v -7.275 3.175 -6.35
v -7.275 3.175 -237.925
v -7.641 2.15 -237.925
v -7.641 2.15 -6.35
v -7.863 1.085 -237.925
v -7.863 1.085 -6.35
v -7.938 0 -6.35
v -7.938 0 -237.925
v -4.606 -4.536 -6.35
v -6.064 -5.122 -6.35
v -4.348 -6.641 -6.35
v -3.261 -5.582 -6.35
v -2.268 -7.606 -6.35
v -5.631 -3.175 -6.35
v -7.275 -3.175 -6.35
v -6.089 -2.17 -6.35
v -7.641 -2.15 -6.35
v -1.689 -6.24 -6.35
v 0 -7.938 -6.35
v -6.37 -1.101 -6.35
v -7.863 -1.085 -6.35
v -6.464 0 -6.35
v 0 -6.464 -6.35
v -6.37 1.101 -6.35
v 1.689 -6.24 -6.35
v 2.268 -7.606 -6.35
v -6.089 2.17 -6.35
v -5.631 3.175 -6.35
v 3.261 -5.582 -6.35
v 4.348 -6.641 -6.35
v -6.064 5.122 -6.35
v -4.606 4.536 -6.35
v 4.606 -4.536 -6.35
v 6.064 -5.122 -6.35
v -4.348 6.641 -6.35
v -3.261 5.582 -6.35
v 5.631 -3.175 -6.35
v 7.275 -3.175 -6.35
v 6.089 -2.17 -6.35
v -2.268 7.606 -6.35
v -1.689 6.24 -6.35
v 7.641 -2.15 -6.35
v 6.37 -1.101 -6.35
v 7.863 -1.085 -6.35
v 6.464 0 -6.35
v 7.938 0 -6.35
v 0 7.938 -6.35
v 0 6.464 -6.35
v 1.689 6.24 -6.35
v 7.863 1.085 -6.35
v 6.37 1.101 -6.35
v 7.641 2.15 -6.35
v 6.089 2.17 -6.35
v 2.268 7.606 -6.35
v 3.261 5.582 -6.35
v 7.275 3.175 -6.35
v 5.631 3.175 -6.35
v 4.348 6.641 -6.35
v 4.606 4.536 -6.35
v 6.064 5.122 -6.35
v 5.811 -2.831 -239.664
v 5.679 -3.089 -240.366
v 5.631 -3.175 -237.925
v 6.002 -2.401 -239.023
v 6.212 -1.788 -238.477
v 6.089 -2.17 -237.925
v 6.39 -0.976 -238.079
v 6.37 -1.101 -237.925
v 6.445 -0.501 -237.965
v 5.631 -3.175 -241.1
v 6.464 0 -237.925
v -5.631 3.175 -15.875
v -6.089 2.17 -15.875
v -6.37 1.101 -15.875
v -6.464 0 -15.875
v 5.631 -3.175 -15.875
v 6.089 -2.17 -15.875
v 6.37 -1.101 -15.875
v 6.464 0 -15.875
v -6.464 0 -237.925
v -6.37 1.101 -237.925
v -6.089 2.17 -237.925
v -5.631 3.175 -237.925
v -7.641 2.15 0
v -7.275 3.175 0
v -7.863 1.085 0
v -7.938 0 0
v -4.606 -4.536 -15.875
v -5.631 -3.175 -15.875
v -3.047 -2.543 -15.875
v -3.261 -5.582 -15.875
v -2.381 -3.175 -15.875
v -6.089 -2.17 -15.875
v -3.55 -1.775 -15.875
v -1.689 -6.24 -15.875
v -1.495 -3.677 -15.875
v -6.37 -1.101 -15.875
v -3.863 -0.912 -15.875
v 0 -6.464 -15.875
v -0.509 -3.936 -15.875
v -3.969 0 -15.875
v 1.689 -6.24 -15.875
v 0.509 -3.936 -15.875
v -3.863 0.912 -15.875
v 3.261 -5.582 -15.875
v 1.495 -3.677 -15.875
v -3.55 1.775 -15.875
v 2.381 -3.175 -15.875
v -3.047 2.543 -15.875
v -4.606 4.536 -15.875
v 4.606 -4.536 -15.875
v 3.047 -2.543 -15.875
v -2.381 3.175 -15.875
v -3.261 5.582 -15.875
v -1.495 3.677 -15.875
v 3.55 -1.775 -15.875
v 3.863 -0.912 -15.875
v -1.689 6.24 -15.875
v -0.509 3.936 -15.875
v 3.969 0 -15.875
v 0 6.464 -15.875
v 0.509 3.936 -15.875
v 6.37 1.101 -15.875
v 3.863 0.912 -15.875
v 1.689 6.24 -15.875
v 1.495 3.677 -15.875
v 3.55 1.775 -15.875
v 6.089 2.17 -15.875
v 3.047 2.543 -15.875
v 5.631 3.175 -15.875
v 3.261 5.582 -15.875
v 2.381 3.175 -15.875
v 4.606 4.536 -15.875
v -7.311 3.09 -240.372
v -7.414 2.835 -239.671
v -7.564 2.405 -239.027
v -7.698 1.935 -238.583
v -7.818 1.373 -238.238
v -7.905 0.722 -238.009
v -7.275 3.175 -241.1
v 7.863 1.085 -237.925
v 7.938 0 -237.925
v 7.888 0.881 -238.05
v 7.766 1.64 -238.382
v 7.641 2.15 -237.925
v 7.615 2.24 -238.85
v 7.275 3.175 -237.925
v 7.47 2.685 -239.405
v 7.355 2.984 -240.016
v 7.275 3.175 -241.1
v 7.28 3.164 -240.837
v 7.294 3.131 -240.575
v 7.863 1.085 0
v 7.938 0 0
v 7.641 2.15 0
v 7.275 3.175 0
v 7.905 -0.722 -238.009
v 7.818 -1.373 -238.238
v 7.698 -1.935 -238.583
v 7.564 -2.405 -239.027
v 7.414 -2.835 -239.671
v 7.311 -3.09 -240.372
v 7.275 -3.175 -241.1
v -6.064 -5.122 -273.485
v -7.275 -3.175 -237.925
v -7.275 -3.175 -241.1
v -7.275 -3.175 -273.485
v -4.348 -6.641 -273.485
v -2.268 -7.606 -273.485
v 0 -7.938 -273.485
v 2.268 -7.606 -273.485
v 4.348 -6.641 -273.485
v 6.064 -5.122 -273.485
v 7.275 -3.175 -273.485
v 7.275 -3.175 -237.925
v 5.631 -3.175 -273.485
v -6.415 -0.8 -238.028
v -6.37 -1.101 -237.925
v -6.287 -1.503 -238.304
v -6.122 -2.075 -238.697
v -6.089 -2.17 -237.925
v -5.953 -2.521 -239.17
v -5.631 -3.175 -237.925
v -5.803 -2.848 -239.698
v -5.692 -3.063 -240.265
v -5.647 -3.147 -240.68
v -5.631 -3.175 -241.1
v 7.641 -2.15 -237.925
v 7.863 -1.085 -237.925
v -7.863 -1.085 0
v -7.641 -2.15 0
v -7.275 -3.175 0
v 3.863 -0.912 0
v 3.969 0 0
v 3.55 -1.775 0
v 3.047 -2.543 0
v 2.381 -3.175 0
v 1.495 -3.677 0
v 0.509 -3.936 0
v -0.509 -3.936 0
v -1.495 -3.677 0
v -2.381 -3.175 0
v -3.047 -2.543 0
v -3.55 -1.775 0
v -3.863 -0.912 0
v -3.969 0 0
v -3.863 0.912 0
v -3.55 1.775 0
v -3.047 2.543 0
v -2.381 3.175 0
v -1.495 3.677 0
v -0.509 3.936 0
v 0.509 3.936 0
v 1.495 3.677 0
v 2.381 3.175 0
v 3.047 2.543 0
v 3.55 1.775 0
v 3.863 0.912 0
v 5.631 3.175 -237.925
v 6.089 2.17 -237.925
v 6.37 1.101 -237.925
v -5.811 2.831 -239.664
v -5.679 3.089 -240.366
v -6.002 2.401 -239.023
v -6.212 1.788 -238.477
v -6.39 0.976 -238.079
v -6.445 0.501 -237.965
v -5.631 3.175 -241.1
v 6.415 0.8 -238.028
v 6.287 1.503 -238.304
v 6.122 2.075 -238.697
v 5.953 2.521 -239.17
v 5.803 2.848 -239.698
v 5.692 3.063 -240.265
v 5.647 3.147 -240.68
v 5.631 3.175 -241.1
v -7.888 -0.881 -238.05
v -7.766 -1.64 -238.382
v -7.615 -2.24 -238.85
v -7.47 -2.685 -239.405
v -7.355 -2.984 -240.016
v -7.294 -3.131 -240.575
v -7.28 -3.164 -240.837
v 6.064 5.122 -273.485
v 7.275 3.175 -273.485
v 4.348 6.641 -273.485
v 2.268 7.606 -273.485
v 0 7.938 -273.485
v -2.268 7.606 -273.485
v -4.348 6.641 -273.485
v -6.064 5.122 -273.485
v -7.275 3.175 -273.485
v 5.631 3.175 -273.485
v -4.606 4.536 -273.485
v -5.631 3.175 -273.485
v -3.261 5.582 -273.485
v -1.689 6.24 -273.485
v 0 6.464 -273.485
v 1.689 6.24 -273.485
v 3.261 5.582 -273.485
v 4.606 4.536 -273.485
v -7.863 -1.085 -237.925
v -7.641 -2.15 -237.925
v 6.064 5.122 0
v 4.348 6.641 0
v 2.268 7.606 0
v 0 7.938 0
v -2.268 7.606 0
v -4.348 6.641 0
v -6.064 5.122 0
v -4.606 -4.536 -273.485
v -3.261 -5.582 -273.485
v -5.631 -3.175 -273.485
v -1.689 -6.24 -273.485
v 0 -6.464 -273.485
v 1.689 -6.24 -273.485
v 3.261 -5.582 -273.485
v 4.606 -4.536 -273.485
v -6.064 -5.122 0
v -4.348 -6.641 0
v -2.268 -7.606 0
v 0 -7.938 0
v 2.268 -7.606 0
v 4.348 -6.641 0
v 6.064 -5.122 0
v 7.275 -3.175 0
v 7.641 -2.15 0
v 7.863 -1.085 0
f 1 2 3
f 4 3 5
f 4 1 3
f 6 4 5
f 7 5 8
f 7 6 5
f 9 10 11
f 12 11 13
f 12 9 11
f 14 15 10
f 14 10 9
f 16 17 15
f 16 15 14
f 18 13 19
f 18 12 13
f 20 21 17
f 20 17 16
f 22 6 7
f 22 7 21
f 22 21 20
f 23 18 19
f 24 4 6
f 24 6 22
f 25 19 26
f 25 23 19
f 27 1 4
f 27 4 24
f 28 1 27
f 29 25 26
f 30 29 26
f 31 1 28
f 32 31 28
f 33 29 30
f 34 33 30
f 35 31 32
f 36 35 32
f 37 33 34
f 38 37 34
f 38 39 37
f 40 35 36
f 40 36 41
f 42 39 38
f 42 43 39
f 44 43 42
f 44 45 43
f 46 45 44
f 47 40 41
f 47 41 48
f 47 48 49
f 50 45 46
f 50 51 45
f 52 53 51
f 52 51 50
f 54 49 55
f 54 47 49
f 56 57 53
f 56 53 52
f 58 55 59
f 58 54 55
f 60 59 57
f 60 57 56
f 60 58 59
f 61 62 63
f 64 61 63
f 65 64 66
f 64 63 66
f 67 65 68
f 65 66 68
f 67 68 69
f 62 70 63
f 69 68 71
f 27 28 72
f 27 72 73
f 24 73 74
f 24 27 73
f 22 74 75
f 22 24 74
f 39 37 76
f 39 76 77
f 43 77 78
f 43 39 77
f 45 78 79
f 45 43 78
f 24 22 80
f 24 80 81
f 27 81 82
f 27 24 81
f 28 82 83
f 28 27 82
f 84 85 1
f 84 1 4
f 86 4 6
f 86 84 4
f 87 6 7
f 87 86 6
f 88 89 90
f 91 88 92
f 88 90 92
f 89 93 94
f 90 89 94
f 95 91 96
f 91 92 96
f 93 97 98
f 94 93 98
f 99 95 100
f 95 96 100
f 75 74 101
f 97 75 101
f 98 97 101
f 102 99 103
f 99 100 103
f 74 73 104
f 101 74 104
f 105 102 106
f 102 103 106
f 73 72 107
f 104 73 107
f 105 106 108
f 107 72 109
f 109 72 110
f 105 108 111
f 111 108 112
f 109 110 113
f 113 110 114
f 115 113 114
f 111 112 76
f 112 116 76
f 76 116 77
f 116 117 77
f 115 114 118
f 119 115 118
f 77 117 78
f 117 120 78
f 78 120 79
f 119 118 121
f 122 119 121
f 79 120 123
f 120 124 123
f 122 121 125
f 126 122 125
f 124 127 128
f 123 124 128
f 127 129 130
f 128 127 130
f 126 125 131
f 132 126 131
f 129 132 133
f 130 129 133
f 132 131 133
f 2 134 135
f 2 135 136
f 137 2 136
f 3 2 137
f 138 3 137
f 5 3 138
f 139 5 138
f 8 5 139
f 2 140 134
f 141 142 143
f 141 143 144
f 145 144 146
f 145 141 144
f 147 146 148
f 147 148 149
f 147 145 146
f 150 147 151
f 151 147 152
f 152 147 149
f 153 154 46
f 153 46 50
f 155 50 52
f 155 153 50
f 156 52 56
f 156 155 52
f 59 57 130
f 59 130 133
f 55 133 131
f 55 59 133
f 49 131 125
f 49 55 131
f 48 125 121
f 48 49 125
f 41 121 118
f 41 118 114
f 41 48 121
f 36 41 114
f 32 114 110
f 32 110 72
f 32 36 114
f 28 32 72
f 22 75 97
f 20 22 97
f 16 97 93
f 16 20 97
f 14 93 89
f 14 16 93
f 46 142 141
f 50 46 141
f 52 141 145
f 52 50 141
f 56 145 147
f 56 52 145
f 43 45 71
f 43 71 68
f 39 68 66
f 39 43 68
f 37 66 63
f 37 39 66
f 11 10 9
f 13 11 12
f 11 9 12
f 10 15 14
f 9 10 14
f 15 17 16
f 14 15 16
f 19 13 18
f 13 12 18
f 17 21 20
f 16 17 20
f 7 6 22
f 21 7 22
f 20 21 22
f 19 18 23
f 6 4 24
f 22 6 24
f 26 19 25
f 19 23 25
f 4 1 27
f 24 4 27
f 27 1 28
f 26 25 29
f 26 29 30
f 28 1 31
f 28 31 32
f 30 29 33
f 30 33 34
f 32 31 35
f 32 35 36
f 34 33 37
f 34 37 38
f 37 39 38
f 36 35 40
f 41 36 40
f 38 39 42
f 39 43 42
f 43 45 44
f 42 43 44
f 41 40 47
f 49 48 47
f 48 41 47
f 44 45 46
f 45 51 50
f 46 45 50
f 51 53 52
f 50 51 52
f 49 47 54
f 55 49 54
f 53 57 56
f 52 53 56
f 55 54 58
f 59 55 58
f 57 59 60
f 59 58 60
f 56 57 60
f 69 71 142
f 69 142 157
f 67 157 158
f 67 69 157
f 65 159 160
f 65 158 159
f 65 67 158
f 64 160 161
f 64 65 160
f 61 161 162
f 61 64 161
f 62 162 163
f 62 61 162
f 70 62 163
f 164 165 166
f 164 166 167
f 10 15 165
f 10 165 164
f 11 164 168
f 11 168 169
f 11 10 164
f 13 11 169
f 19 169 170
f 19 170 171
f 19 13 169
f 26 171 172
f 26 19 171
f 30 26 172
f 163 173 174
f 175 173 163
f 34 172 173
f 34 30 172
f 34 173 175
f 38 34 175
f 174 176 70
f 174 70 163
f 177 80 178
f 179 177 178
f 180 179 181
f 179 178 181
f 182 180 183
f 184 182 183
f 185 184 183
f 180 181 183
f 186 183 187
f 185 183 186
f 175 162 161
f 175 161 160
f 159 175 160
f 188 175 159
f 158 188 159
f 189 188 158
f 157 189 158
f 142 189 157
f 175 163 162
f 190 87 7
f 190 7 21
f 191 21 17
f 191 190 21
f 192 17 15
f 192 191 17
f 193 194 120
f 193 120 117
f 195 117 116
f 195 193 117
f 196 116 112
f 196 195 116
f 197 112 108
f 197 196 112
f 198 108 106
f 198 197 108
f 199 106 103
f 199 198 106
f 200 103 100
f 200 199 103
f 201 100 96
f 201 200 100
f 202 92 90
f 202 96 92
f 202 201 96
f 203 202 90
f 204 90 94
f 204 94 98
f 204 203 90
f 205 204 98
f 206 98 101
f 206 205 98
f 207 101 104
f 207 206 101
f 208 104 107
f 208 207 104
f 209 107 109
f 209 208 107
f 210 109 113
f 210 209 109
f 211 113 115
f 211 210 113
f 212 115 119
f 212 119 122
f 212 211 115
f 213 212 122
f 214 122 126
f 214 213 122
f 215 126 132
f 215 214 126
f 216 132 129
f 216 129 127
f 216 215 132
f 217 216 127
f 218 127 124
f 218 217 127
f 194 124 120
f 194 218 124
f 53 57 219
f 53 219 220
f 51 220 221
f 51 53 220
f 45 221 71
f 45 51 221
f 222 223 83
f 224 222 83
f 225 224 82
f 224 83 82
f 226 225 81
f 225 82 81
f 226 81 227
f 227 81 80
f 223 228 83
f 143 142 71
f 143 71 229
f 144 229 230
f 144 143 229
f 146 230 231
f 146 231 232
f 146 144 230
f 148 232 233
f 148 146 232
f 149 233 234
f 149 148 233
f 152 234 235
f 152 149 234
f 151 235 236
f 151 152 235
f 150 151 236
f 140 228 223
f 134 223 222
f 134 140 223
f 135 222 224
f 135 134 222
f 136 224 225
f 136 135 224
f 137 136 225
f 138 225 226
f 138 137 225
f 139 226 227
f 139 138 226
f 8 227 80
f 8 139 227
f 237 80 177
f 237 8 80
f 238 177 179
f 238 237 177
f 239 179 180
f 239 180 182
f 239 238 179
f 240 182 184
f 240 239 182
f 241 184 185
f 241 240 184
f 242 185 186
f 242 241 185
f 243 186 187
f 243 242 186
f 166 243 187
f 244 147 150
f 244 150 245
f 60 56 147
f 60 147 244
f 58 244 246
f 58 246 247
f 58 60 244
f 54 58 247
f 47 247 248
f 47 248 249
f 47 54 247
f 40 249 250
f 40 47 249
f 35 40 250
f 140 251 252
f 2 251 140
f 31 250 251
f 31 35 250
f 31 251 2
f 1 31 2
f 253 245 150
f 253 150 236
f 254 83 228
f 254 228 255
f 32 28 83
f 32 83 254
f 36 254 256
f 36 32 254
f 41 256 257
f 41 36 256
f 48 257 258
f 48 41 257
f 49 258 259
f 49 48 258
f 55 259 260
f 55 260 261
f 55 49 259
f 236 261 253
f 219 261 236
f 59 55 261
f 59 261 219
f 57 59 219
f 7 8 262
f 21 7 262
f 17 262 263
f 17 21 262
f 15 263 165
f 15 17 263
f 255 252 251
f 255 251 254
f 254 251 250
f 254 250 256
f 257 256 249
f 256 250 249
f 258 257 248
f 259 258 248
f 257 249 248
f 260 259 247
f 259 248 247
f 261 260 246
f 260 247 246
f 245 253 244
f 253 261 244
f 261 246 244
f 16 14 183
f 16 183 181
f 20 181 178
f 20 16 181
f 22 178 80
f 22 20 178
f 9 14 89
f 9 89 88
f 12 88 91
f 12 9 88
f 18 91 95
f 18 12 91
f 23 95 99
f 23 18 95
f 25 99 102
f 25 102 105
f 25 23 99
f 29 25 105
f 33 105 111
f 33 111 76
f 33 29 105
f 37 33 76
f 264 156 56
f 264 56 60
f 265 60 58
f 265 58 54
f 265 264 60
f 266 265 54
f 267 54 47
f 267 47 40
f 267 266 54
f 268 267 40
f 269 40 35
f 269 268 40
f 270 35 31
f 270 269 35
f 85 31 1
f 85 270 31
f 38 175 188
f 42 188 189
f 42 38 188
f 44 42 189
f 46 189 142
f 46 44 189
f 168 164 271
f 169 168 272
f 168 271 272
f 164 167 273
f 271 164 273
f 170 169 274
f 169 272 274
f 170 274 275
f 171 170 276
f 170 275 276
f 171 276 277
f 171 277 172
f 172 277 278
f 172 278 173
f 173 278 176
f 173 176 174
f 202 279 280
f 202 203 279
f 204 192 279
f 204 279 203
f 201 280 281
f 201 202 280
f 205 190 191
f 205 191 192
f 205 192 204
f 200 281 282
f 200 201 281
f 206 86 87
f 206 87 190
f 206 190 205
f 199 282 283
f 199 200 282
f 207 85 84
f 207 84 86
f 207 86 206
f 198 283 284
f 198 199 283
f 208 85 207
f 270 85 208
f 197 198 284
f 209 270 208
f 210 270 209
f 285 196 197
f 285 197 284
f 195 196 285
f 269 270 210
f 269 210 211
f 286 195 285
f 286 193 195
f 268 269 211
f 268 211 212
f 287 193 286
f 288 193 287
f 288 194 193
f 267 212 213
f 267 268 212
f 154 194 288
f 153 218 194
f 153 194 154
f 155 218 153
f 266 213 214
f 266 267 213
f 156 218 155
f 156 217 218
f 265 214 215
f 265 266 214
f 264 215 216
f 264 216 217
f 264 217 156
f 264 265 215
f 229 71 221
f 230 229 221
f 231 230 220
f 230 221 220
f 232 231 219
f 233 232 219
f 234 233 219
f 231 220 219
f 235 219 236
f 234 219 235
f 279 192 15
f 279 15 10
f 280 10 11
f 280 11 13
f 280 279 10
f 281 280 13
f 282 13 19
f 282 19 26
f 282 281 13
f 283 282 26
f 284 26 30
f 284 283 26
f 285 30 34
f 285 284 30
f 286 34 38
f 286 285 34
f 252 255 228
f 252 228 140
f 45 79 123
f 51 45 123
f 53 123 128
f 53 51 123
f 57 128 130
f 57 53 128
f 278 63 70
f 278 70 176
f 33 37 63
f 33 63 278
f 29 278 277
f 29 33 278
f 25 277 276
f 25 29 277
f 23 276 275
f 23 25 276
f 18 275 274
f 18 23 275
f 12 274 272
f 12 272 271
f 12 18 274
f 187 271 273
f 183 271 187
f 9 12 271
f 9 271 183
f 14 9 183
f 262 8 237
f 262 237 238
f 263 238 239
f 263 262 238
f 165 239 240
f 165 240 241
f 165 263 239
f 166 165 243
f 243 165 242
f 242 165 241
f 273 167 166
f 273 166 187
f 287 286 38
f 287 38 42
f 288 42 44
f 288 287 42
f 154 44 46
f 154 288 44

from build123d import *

# Parameters (mm, degrees)
THREADED_INSERT_1_1_DEPTH = 6.35
THREADED_START            = -6.35
THREADED_INSERT_1_2_DEPTH = 9.525
A_ARM_START               = -6.35
A_ARM_TUBE_DEPTH          = 267.13536
APEX_START                = -237.92536
APEX_SLOT_DEPTH           = 35.56
FILLET1_R                 = 3.175


with BuildPart() as part:
    # Sketch1 → Threaded insert 1-1 (new body)
    with BuildSketch(Plane.XY):
        with BuildLine():
            ThreePointArc((-2.38125, 3.175), (0, 3.96875), (2.38125, 3.175))
            Line((2.38125, 3.175), (5.630856905, 3.175))
            ThreePointArc((5.630856905, 3.175), (0, 6.4643), (-5.630856905, 3.175))
            Line((-5.630856905, 3.175), (-2.38125, 3.175))
        make_face()
        with BuildLine():
            ThreePointArc((-5.630856905, 3.175), (0, 6.4643), (5.630856905, 3.175))
            Line((5.630856905, 3.175), (7.274838916, 3.175))
            ThreePointArc((7.274838916, 3.175), (0, 7.9375), (-7.274838916, 3.175))
            Line((-7.274838916, 3.175), (-5.630856905, 3.175))
        make_face()
        with BuildLine():
            ThreePointArc((2.38125, 3.175), (3.549757914, 1.774878957), (3.96875, 0))
            Line((3.96875, 0), (6.4643, 0))
            ThreePointArc((6.4643, 0), (6.252468424, 1.641283978), (5.630856905, 3.175))
            Line((5.630856905, 3.175), (2.38125, 3.175))
        make_face()
        with BuildLine():
            Line((-6.4643, 0), (-3.96875, 0))
            ThreePointArc((-3.96875, 0), (-3.549757914, 1.774878957), (-2.38125, 3.175))
            Line((-2.38125, 3.175), (-5.630856905, 3.175))
            ThreePointArc((-5.630856905, 3.175), (-6.252468424, 1.641283978), (-6.4643, 0))
        make_face()
        with BuildLine():
            ThreePointArc((5.630856905, 3.175), (6.252468424, 1.641283978), (6.4643, 0))
            Line((6.4643, 0), (7.9375, 0))
            ThreePointArc((7.9375, 0), (7.770068859, 1.621707797), (7.274838916, 3.175))
            Line((7.274838916, 3.175), (5.630856905, 3.175))
        make_face()
        with BuildLine():
            Line((-7.9375, 0), (-6.4643, 0))
            ThreePointArc((-6.4643, 0), (-6.252468424, 1.641283978), (-5.630856905, 3.175))
            Line((-5.630856905, 3.175), (-7.274838916, 3.175))
            ThreePointArc((-7.274838916, 3.175), (-7.770068859, 1.621707797), (-7.9375, 0))
        make_face()
        with BuildLine():
            Line((7.9375, 0), (6.4643, 0))
            ThreePointArc((6.4643, 0), (6.252468424, -1.641283978), (5.630856905, -3.175))
            Line((5.630856905, -3.175), (7.274838916, -3.175))
            ThreePointArc((7.274838916, -3.175), (7.770068859, -1.621707797), (7.9375, 0))
        make_face()
        with BuildLine():
            ThreePointArc((-5.630856905, -3.175), (-6.252468424, -1.641283978), (-6.4643, 0))
            Line((-6.4643, 0), (-7.9375, 0))
            ThreePointArc((-7.9375, 0), (-7.770068859, -1.621707797), (-7.274838916, -3.175))
            Line((-7.274838916, -3.175), (-5.630856905, -3.175))
        make_face()
        with BuildLine():
            Line((6.4643, 0), (3.96875, 0))
            ThreePointArc((3.96875, 0), (3.549757914, -1.774878957), (2.38125, -3.175))
            Line((2.38125, -3.175), (5.630856905, -3.175))
            ThreePointArc((5.630856905, -3.175), (6.252468424, -1.641283978), (6.4643, 0))
        make_face()
        with BuildLine():
            ThreePointArc((-2.38125, -3.175), (-3.549757914, -1.774878957), (-3.96875, 0))
            Line((-3.96875, 0), (-6.4643, 0))
            ThreePointArc((-6.4643, 0), (-6.252468424, -1.641283978), (-5.630856905, -3.175))
            Line((-5.630856905, -3.175), (-2.38125, -3.175))
        make_face()
        with BuildLine():
            Line((5.630856905, -3.175), (2.38125, -3.175))
            ThreePointArc((2.38125, -3.175), (0, -3.96875), (-2.38125, -3.175))
            Line((-2.38125, -3.175), (-5.630856905, -3.175))
            ThreePointArc((-5.630856905, -3.175), (0, -6.4643), (5.630856905, -3.175))
        make_face()
        with BuildLine():
            Line((7.274838916, -3.175), (5.630856905, -3.175))
            ThreePointArc((5.630856905, -3.175), (0, -6.4643), (-5.630856905, -3.175))
            Line((-5.630856905, -3.175), (-7.274838916, -3.175))
            ThreePointArc((-7.274838916, -3.175), (0, -7.9375), (7.274838916, -3.175))
        make_face()
    extrude(amount=-THREADED_INSERT_1_1_DEPTH)

    # Sketch1<3> → Threaded insert 1-2 (add)
    with BuildSketch(Plane.XY.offset(THREADED_START)):
        with BuildLine():
            ThreePointArc((-2.38125, 3.175), (0, 3.96875), (2.38125, 3.175))
            Line((2.38125, 3.175), (5.630856905, 3.175))
            ThreePointArc((5.630856905, 3.175), (0, 6.4643), (-5.630856905, 3.175))
            Line((-5.630856905, 3.175), (-2.38125, 3.175))
        make_face()
        with BuildLine():
            ThreePointArc((2.38125, 3.175), (3.549757914, 1.774878957), (3.96875, 0))
            Line((3.96875, 0), (6.4643, 0))
            ThreePointArc((6.4643, 0), (6.252468424, 1.641283978), (5.630856905, 3.175))
            Line((5.630856905, 3.175), (2.38125, 3.175))
        make_face()
        with BuildLine():
            Line((-6.4643, 0), (-3.96875, 0))
            ThreePointArc((-3.96875, 0), (-3.549757914, 1.774878957), (-2.38125, 3.175))
            Line((-2.38125, 3.175), (-5.630856905, 3.175))
            ThreePointArc((-5.630856905, 3.175), (-6.252468424, 1.641283978), (-6.4643, 0))
        make_face()
        with BuildLine():
            Line((6.4643, 0), (3.96875, 0))
            ThreePointArc((3.96875, 0), (3.549757914, -1.774878957), (2.38125, -3.175))
            Line((2.38125, -3.175), (5.630856905, -3.175))
            ThreePointArc((5.630856905, -3.175), (6.252468424, -1.641283978), (6.4643, 0))
        make_face()
        with BuildLine():
            ThreePointArc((-2.38125, -3.175), (-3.549757914, -1.774878957), (-3.96875, 0))
            Line((-3.96875, 0), (-6.4643, 0))
            ThreePointArc((-6.4643, 0), (-6.252468424, -1.641283978), (-5.630856905, -3.175))
            Line((-5.630856905, -3.175), (-2.38125, -3.175))
        make_face()
        with BuildLine():
            Line((5.630856905, -3.175), (2.38125, -3.175))
            ThreePointArc((2.38125, -3.175), (0, -3.96875), (-2.38125, -3.175))
            Line((-2.38125, -3.175), (-5.630856905, -3.175))
            ThreePointArc((-5.630856905, -3.175), (0, -6.4643), (5.630856905, -3.175))
        make_face()
    extrude(amount=-THREADED_INSERT_1_2_DEPTH)


with BuildPart() as body_2:
    # Sketch1<4> → A-arm tube (new body)
    with BuildSketch(Plane.XY.offset(A_ARM_START)):
        with BuildLine():
            ThreePointArc((-5.630856905, 3.175), (0, 6.4643), (5.630856905, 3.175))
            Line((5.630856905, 3.175), (7.274838916, 3.175))
            ThreePointArc((7.274838916, 3.175), (0, 7.9375), (-7.274838916, 3.175))
            Line((-7.274838916, 3.175), (-5.630856905, 3.175))
        make_face()
        with BuildLine():
            ThreePointArc((5.630856905, 3.175), (6.252468424, 1.641283978), (6.4643, 0))
            Line((6.4643, 0), (7.9375, 0))
            ThreePointArc((7.9375, 0), (7.770068859, 1.621707797), (7.274838916, 3.175))
            Line((7.274838916, 3.175), (5.630856905, 3.175))
        make_face()
        with BuildLine():
            Line((-7.9375, 0), (-6.4643, 0))
            ThreePointArc((-6.4643, 0), (-6.252468424, 1.641283978), (-5.630856905, 3.175))
            Line((-5.630856905, 3.175), (-7.274838916, 3.175))
            ThreePointArc((-7.274838916, 3.175), (-7.770068859, 1.621707797), (-7.9375, 0))
        make_face()
        with BuildLine():
            Line((7.9375, 0), (6.4643, 0))
            ThreePointArc((6.4643, 0), (6.252468424, -1.641283978), (5.630856905, -3.175))
            Line((5.630856905, -3.175), (7.274838916, -3.175))
            ThreePointArc((7.274838916, -3.175), (7.770068859, -1.621707797), (7.9375, 0))
        make_face()
        with BuildLine():
            ThreePointArc((-5.630856905, -3.175), (-6.252468424, -1.641283978), (-6.4643, 0))
            Line((-6.4643, 0), (-7.9375, 0))
            ThreePointArc((-7.9375, 0), (-7.770068859, -1.621707797), (-7.274838916, -3.175))
            Line((-7.274838916, -3.175), (-5.630856905, -3.175))
        make_face()
        with BuildLine():
            Line((7.274838916, -3.175), (5.630856905, -3.175))
            ThreePointArc((5.630856905, -3.175), (0, -6.4643), (-5.630856905, -3.175))
            Line((-5.630856905, -3.175), (-7.274838916, -3.175))
            ThreePointArc((-7.274838916, -3.175), (0, -7.9375), (7.274838916, -3.175))
        make_face()
    extrude(amount=-A_ARM_TUBE_DEPTH)

    # Sketch1<5> → Apex slot (cut)
    with BuildSketch(Plane.XY.offset(APEX_START)):
        with BuildLine():
            ThreePointArc((5.630856905, 3.175), (6.252468424, 1.641283978), (6.4643, 0))
            Line((6.4643, 0), (7.9375, 0))
            ThreePointArc((7.9375, 0), (7.770068859, 1.621707797), (7.274838916, 3.175))
            Line((7.274838916, 3.175), (5.630856905, 3.175))
        make_face()
        with BuildLine():
            Line((-7.9375, 0), (-6.4643, 0))
            ThreePointArc((-6.4643, 0), (-6.252468424, 1.641283978), (-5.630856905, 3.175))
            Line((-5.630856905, 3.175), (-7.274838916, 3.175))
            ThreePointArc((-7.274838916, 3.175), (-7.770068859, 1.621707797), (-7.9375, 0))
        make_face()
        with BuildLine():
            Line((7.9375, 0), (6.4643, 0))
            ThreePointArc((6.4643, 0), (6.252468424, -1.641283978), (5.630856905, -3.175))
            Line((5.630856905, -3.175), (7.274838916, -3.175))
            ThreePointArc((7.274838916, -3.175), (7.770068859, -1.621707797), (7.9375, 0))
        make_face()
        with BuildLine():
            ThreePointArc((-5.630856905, -3.175), (-6.252468424, -1.641283978), (-6.4643, 0))
            Line((-6.4643, 0), (-7.9375, 0))
            ThreePointArc((-7.9375, 0), (-7.770068859, -1.621707797), (-7.274838916, -3.175))
            Line((-7.274838916, -3.175), (-5.630856905, -3.175))
        make_face()
    extrude(amount=-APEX_SLOT_DEPTH, mode=Mode.SUBTRACT)

    # Fillet1
    # the kernel refuses this fillet: 3.175 mm, written as the material it adds along each edge
    with BuildSketch(Plane(origin=(2.306643095, 3.175, -237.92536), x_dir=(0, 0, -1), z_dir=(-1, 0, 0))) as fillet1_piece_1_section:
        with BuildLine():
            CenterArc((FILLET1_R, FILLET1_R), FILLET1_R, 180, 90)
            Line((0, FILLET1_R), (0, 0))
            Line((0, 0), (FILLET1_R, 0))
        make_face()
    fillet1_piece_1 = extrude(amount=17.51898201, mode=Mode.PRIVATE)
    fillet1_piece_1 = fillet1_piece_1 - Plane(origin=(0, 0, -238.64509262), x_dir=(-0.8710698614669244, 0.49115913555994567, 0), z_dir=(0, 0, 1)) * Cylinder(6.4643, 48, mode=Mode.PRIVATE)
    fillet1_piece_1 = fillet1_piece_1 & Plane(origin=(0, 0, -238.64509262), x_dir=(-1, 0, 0), z_dir=(0, 0, 1)) * Cylinder(7.9375, 48, mode=Mode.PRIVATE)
    add(fillet1_piece_1)
    with BuildSketch(Plane(origin=(-15.212338916, -3.175, -237.92536), x_dir=(0, 0, -1), z_dir=(1, 0, 0))) as fillet1_piece_2_section:
        with BuildLine():
            CenterArc((FILLET1_R, FILLET1_R), FILLET1_R, 180, 90)
            Line((0, FILLET1_R), (0, 0))
            Line((0, 0), (FILLET1_R, 0))
        make_face()
    fillet1_piece_2 = extrude(amount=17.51898201, mode=Mode.PRIVATE)
    fillet1_piece_2 = fillet1_piece_2 - Plane(origin=(0, 0, -238.645092783), x_dir=(-0.8710698614669244, 0.49115913555994567, 0), z_dir=(0, 0, 1)) * Cylinder(6.4643, 48, mode=Mode.PRIVATE)
    fillet1_piece_2 = fillet1_piece_2 & Plane(origin=(0, 0, -238.645092783), x_dir=(-1, 0, 0), z_dir=(0, 0, 1)) * Cylinder(7.9375, 48, mode=Mode.PRIVATE)
    add(fillet1_piece_2)
    with BuildSketch(Plane(origin=(-2.306643095, -3.175, -237.92536), x_dir=(0, 0, -1), z_dir=(1, 0, 0))) as fillet1_piece_3_section:
        with BuildLine():
            CenterArc((FILLET1_R, FILLET1_R), FILLET1_R, 180, 90)
            Line((0, FILLET1_R), (0, 0))
            Line((0, 0), (FILLET1_R, 0))
        make_face()
    fillet1_piece_3 = extrude(amount=17.51898201, mode=Mode.PRIVATE)
    fillet1_piece_3 = fillet1_piece_3 - Plane(origin=(0, 0, -238.64509262), x_dir=(-0.8710698614669244, 0.49115913555994567, 0), z_dir=(0, 0, 1)) * Cylinder(6.4643, 48, mode=Mode.PRIVATE)
    fillet1_piece_3 = fillet1_piece_3 & Plane(origin=(0, 0, -238.64509262), x_dir=(-1, 0, 0), z_dir=(0, 0, 1)) * Cylinder(7.9375, 48, mode=Mode.PRIVATE)
    add(fillet1_piece_3)
    with BuildSketch(Plane(origin=(15.212338916, 3.175, -237.92536), x_dir=(0, -1, 0), z_dir=(-1, 0, 0))) as fillet1_piece_4_section:
        with BuildLine():
            CenterArc((FILLET1_R, -FILLET1_R), FILLET1_R, 90, 90)
            Line((0, -FILLET1_R), (0, 0))
            Line((0, 0), (FILLET1_R, 0))
        make_face()
    fillet1_piece_4 = extrude(amount=17.51898201, mode=Mode.PRIVATE)
    fillet1_piece_4 = fillet1_piece_4 - Plane(origin=(0, 0, -238.645092609), x_dir=(-0.8710698614669244, 0.49115913555994567, 0), z_dir=(0, 0, 1)) * Cylinder(6.4643, 48, mode=Mode.PRIVATE)
    fillet1_piece_4 = fillet1_piece_4 & Plane(origin=(0, 0, -238.645092609), x_dir=(-1, 0, 0), z_dir=(0, 0, 1)) * Cylinder(7.9375, 48, mode=Mode.PRIVATE)
    add(fillet1_piece_4)


solid = Compound([part.part, body_2.part])
